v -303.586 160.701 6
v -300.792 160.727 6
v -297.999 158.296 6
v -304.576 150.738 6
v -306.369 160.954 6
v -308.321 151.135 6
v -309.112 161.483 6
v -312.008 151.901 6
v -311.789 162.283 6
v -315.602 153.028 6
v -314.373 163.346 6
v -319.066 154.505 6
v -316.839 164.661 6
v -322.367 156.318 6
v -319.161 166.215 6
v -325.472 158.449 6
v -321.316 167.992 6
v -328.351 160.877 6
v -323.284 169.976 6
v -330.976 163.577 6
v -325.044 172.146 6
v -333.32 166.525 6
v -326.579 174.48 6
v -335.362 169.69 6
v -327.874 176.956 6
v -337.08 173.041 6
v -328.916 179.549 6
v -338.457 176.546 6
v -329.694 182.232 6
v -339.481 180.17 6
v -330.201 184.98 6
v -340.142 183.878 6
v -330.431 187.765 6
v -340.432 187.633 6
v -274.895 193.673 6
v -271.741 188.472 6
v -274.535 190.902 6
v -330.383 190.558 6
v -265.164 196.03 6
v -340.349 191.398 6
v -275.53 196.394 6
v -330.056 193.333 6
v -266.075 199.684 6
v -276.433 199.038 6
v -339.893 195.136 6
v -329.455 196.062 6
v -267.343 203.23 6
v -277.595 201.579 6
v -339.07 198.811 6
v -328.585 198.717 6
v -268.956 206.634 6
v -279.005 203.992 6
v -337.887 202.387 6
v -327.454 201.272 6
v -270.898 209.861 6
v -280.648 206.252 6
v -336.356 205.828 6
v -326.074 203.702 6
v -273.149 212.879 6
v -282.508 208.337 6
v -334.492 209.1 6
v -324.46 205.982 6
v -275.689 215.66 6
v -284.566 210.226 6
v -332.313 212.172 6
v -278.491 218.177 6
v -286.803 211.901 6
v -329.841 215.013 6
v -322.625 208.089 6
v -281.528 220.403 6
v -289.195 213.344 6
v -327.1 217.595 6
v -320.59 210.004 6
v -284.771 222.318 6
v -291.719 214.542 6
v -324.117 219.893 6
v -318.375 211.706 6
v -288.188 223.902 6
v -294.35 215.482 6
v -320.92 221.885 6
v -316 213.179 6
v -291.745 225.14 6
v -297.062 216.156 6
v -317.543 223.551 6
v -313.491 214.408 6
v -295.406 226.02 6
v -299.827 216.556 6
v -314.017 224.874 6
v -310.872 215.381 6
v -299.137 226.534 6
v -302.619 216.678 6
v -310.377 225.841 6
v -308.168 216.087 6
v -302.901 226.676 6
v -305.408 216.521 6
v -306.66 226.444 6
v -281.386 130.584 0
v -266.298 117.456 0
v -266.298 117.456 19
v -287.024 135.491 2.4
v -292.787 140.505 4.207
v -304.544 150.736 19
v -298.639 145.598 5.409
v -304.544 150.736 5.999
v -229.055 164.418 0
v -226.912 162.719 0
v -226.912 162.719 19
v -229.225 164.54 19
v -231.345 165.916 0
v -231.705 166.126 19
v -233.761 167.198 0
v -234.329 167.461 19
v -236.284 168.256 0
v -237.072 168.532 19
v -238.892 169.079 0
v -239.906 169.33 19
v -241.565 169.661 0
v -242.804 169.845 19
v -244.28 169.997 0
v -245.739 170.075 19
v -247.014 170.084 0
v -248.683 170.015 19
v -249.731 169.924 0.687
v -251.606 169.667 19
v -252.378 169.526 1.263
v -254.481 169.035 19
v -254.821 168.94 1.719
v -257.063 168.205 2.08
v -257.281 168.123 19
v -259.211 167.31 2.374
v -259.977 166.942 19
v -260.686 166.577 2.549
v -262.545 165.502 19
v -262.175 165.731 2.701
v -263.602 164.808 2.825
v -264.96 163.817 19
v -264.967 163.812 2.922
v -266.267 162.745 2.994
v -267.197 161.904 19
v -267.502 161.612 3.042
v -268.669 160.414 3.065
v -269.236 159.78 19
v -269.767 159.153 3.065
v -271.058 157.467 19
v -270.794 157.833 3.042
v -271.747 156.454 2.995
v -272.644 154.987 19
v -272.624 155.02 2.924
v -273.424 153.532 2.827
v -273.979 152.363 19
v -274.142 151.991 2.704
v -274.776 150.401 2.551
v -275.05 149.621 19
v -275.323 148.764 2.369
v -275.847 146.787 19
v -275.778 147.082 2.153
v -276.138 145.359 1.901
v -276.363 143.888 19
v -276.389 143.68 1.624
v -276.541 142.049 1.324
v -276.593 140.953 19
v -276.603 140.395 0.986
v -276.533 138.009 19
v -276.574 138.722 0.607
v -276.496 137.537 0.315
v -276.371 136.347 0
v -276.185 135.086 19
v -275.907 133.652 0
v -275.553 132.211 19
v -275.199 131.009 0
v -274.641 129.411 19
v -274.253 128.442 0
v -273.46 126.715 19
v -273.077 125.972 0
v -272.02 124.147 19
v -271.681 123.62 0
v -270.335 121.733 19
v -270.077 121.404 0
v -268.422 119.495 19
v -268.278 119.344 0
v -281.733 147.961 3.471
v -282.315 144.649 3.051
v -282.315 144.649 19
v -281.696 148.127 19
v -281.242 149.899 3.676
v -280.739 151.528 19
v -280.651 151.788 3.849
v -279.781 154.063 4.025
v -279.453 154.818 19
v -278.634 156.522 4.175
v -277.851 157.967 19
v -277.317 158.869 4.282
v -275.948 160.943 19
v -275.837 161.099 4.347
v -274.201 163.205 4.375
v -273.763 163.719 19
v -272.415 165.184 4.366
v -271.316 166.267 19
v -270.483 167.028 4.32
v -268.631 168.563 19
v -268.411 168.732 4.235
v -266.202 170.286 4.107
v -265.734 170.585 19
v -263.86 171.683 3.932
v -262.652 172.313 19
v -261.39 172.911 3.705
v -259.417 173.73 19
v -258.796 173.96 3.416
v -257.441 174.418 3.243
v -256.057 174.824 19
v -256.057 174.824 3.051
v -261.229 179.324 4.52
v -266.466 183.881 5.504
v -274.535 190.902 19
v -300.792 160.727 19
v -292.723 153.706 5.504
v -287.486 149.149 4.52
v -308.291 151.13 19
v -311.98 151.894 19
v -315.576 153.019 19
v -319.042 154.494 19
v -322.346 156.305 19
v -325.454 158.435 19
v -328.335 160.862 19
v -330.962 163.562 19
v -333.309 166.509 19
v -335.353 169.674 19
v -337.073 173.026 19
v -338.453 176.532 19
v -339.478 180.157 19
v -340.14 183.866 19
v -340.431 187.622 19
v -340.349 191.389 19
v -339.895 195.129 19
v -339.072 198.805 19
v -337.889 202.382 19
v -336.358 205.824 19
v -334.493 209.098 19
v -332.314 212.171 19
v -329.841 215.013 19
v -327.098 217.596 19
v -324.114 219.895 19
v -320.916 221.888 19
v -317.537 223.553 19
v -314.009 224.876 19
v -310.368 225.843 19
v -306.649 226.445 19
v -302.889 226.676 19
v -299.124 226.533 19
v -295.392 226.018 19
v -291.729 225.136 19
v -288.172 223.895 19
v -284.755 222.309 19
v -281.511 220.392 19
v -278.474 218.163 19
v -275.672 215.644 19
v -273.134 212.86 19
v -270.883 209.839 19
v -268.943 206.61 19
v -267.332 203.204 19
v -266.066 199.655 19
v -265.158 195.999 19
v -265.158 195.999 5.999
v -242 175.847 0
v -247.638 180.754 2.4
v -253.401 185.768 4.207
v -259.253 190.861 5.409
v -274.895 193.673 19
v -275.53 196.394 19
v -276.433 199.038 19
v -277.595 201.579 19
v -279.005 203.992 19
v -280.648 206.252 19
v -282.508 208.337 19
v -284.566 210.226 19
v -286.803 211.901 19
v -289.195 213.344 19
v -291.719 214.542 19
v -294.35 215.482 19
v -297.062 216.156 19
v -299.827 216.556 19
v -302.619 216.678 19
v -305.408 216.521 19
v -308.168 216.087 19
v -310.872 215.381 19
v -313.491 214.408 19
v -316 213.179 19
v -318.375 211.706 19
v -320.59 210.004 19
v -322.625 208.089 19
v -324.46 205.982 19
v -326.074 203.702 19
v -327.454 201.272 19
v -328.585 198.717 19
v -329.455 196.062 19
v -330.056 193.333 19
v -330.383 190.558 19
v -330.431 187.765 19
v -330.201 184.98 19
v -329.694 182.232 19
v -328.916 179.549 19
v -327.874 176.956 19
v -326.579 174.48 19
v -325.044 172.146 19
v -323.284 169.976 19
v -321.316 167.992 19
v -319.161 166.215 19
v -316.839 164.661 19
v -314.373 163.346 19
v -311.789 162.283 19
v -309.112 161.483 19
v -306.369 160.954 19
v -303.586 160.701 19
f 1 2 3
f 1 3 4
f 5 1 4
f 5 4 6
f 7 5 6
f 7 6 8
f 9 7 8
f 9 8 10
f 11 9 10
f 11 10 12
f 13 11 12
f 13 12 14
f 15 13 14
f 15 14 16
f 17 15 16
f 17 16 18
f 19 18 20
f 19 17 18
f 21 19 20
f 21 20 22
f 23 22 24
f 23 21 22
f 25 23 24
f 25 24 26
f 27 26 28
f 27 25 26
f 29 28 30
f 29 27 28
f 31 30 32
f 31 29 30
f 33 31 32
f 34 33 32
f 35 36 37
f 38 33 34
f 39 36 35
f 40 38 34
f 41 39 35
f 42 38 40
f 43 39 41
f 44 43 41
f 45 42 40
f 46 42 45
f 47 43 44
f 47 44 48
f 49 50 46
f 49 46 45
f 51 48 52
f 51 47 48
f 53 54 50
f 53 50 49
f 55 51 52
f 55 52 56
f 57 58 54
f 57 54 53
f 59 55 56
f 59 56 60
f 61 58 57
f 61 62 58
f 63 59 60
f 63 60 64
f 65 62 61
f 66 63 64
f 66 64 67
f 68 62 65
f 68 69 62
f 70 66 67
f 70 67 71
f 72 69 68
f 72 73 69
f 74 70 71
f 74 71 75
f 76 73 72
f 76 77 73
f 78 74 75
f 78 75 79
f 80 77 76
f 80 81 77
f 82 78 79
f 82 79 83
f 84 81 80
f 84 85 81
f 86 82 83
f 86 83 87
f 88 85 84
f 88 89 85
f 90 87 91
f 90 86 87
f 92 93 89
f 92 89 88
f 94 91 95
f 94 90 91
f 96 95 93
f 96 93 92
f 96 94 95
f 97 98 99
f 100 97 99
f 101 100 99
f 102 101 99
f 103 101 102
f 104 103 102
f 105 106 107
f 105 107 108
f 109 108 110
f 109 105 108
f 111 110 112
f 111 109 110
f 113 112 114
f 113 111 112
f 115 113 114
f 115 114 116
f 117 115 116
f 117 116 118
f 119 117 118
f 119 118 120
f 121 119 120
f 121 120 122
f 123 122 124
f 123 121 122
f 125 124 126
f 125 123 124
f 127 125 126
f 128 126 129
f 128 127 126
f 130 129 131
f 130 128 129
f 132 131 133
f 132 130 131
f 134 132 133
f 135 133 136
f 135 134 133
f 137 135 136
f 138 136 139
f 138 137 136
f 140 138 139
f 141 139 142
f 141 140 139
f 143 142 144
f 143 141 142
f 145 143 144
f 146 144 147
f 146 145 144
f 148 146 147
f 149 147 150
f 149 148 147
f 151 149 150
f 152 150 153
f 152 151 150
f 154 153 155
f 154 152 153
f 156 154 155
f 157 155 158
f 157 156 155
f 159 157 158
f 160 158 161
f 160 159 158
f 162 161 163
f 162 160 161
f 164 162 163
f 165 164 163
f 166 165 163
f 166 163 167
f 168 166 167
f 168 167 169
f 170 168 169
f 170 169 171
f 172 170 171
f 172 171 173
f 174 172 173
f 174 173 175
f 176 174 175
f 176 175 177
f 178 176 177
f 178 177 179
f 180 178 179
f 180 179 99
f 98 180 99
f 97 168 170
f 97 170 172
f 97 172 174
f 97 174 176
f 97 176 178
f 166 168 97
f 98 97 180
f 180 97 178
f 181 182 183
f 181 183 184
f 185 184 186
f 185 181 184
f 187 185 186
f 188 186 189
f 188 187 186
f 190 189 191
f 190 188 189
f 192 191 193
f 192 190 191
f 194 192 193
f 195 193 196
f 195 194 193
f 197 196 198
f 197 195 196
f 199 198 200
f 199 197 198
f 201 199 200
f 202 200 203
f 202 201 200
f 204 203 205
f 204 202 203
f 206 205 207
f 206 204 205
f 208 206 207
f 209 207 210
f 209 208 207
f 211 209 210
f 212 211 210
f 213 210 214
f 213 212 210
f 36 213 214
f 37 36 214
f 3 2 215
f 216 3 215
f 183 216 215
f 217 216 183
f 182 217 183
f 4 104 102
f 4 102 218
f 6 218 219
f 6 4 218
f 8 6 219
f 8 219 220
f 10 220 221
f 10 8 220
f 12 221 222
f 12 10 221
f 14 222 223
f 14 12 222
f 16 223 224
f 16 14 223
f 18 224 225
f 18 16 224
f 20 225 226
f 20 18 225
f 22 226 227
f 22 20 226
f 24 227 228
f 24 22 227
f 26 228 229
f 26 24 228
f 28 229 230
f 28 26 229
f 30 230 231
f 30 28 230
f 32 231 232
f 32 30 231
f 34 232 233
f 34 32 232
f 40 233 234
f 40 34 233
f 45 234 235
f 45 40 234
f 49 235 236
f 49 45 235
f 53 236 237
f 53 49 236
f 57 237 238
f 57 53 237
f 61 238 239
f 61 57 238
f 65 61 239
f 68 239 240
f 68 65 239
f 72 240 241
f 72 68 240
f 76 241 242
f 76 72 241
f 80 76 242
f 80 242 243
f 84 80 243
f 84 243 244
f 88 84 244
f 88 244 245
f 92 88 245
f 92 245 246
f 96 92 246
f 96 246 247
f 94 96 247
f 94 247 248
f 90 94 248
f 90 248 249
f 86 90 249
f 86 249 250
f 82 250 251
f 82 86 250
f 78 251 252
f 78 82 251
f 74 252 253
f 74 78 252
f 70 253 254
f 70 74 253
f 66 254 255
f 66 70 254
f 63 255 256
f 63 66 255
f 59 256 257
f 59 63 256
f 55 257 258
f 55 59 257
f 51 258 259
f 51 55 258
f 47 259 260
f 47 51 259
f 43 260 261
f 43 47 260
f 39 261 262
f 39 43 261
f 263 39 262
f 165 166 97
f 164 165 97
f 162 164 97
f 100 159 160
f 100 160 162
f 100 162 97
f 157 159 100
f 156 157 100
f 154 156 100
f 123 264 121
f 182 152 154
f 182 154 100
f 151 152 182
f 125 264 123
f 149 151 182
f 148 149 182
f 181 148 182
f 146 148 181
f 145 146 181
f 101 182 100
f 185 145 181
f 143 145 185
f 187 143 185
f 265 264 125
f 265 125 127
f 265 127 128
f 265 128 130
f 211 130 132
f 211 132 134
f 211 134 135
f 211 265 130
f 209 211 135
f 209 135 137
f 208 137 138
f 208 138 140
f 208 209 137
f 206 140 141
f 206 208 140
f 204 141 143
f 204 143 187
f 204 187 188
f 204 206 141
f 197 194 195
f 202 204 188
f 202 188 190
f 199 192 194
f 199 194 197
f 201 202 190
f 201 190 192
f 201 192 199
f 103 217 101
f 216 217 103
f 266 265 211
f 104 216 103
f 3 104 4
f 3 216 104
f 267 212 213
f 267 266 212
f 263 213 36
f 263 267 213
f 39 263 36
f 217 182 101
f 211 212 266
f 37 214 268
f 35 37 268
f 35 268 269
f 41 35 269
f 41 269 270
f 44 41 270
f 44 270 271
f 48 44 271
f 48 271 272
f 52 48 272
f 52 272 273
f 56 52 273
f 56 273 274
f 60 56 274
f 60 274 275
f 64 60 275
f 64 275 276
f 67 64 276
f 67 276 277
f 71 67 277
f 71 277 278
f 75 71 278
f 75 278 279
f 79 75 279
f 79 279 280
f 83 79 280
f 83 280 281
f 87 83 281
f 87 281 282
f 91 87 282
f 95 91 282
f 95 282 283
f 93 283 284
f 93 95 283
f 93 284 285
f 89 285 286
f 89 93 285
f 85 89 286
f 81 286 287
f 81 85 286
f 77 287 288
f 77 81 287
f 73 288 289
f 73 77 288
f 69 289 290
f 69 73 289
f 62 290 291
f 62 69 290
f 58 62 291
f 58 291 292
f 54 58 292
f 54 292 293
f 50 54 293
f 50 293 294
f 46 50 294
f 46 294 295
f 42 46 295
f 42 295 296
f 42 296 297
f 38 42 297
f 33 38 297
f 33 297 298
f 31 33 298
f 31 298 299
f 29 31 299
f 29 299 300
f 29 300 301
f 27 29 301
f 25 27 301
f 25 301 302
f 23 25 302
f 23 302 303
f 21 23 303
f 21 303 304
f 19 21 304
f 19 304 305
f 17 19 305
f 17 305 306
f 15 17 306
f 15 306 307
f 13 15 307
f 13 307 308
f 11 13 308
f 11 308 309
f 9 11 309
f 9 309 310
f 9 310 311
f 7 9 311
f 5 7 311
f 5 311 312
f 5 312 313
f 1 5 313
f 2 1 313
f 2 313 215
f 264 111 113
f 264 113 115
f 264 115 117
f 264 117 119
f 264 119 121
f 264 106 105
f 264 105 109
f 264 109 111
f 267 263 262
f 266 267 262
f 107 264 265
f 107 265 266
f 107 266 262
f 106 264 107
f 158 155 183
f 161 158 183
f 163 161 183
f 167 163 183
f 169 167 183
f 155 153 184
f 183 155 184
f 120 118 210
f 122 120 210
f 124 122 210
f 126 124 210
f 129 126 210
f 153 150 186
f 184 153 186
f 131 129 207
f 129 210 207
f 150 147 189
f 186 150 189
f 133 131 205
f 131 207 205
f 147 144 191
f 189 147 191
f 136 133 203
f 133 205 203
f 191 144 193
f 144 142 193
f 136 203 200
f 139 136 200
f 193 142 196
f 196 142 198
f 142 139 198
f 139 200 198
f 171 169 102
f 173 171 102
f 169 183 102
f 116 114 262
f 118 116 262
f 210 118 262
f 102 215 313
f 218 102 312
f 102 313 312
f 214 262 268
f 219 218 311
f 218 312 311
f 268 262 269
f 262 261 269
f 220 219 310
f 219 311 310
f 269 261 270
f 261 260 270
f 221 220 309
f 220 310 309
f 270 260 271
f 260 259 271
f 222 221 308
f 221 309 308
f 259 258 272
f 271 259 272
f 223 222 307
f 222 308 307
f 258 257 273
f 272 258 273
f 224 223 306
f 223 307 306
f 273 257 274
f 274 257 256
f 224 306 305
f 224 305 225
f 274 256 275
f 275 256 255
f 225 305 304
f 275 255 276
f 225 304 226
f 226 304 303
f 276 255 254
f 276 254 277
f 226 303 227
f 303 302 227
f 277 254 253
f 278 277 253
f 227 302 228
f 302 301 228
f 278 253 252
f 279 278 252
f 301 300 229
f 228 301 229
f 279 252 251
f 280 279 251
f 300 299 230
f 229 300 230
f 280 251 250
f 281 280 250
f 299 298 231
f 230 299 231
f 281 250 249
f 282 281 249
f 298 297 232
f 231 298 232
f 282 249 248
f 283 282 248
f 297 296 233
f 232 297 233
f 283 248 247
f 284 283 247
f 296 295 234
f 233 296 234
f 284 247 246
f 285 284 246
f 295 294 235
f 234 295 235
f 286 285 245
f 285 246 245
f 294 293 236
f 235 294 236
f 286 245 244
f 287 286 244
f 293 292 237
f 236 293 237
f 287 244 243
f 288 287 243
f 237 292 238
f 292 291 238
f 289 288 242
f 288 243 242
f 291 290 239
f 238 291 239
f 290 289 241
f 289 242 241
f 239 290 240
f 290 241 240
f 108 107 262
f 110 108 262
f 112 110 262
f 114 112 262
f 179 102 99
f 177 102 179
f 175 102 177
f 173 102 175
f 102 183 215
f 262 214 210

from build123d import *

# Parameters (mm, degrees)
BOSS_EXTRUDE1_DEPTH     = 19
CUT_EXTRUDE1_DEPTH      = 49.249947637
CUT_EXTRUDE1_DEPTH_BACK = 109.67350832


with BuildPart() as part:
    # Sketch1 → Boss-Extrude1 (new body)
    with BuildSketch(Plane.XY):
        with BuildLine():
            Line((-265.157990376, 195.999066862), (-226.911895103, 162.718581948))
            ThreePointArc((-226.911895103, 162.718581948), (-269.236431055, 159.780273509), (-266.298122616, 117.455737558))
            Line((-266.298122616, 117.455737558), (-304.54421789, 150.736222472))
            ThreePointArc((-304.54421789, 150.736222472), (-331.112603464, 213.622868622), (-265.157990376, 195.999066862))
        make_face()
        with BuildLine():
            Line((-300.79209478, 160.727155027), (-282.314825505, 144.648847504))
            ThreePointArc((-282.314825505, 144.648847504), (-273.762715494, 163.71889626), (-256.057340496, 174.824077098))
            Line((-256.057340496, 174.824077098), (-274.534609771, 190.902384621))
            ThreePointArc((-274.534609771, 190.902384621), (-323.568796066, 207.05849737), (-300.79209478, 160.727155027))
        make_face(mode=Mode.SUBTRACT)
    extrude(amount=BOSS_EXTRUDE1_DEPTH)

    # Sketch2 → Cut-Extrude1 (cut, two sides)
    with BuildSketch(Plane(origin=(-17.199721271, -19.766003413, 0), x_dir=(0.75438074, -0.656437125, 0), z_dir=(0.656437125, 0.75438074, 0))) as cut_extrude1_sk:
        with BuildLine():
            Line((-407.026362297, 14.142127452), (-297.992481459, 14.142127452))
            Line((-297.992481459, 14.142127452), (-297.992481459, 0))
            ThreePointArc((-297.992481459, 0), (-313.1180692, -4.209672376), (-328.716129113, -6))
            Line((-328.716129113, -6), (-407.026362297, -6))
            Line((-407.026362297, -6), (-407.026362297, 14.142127452))
        make_face()
    extrude(amount=CUT_EXTRUDE1_DEPTH, mode=Mode.SUBTRACT)
    extrude(cut_extrude1_sk.sketch, amount=-CUT_EXTRUDE1_DEPTH_BACK, mode=Mode.SUBTRACT)


solid = part.part
